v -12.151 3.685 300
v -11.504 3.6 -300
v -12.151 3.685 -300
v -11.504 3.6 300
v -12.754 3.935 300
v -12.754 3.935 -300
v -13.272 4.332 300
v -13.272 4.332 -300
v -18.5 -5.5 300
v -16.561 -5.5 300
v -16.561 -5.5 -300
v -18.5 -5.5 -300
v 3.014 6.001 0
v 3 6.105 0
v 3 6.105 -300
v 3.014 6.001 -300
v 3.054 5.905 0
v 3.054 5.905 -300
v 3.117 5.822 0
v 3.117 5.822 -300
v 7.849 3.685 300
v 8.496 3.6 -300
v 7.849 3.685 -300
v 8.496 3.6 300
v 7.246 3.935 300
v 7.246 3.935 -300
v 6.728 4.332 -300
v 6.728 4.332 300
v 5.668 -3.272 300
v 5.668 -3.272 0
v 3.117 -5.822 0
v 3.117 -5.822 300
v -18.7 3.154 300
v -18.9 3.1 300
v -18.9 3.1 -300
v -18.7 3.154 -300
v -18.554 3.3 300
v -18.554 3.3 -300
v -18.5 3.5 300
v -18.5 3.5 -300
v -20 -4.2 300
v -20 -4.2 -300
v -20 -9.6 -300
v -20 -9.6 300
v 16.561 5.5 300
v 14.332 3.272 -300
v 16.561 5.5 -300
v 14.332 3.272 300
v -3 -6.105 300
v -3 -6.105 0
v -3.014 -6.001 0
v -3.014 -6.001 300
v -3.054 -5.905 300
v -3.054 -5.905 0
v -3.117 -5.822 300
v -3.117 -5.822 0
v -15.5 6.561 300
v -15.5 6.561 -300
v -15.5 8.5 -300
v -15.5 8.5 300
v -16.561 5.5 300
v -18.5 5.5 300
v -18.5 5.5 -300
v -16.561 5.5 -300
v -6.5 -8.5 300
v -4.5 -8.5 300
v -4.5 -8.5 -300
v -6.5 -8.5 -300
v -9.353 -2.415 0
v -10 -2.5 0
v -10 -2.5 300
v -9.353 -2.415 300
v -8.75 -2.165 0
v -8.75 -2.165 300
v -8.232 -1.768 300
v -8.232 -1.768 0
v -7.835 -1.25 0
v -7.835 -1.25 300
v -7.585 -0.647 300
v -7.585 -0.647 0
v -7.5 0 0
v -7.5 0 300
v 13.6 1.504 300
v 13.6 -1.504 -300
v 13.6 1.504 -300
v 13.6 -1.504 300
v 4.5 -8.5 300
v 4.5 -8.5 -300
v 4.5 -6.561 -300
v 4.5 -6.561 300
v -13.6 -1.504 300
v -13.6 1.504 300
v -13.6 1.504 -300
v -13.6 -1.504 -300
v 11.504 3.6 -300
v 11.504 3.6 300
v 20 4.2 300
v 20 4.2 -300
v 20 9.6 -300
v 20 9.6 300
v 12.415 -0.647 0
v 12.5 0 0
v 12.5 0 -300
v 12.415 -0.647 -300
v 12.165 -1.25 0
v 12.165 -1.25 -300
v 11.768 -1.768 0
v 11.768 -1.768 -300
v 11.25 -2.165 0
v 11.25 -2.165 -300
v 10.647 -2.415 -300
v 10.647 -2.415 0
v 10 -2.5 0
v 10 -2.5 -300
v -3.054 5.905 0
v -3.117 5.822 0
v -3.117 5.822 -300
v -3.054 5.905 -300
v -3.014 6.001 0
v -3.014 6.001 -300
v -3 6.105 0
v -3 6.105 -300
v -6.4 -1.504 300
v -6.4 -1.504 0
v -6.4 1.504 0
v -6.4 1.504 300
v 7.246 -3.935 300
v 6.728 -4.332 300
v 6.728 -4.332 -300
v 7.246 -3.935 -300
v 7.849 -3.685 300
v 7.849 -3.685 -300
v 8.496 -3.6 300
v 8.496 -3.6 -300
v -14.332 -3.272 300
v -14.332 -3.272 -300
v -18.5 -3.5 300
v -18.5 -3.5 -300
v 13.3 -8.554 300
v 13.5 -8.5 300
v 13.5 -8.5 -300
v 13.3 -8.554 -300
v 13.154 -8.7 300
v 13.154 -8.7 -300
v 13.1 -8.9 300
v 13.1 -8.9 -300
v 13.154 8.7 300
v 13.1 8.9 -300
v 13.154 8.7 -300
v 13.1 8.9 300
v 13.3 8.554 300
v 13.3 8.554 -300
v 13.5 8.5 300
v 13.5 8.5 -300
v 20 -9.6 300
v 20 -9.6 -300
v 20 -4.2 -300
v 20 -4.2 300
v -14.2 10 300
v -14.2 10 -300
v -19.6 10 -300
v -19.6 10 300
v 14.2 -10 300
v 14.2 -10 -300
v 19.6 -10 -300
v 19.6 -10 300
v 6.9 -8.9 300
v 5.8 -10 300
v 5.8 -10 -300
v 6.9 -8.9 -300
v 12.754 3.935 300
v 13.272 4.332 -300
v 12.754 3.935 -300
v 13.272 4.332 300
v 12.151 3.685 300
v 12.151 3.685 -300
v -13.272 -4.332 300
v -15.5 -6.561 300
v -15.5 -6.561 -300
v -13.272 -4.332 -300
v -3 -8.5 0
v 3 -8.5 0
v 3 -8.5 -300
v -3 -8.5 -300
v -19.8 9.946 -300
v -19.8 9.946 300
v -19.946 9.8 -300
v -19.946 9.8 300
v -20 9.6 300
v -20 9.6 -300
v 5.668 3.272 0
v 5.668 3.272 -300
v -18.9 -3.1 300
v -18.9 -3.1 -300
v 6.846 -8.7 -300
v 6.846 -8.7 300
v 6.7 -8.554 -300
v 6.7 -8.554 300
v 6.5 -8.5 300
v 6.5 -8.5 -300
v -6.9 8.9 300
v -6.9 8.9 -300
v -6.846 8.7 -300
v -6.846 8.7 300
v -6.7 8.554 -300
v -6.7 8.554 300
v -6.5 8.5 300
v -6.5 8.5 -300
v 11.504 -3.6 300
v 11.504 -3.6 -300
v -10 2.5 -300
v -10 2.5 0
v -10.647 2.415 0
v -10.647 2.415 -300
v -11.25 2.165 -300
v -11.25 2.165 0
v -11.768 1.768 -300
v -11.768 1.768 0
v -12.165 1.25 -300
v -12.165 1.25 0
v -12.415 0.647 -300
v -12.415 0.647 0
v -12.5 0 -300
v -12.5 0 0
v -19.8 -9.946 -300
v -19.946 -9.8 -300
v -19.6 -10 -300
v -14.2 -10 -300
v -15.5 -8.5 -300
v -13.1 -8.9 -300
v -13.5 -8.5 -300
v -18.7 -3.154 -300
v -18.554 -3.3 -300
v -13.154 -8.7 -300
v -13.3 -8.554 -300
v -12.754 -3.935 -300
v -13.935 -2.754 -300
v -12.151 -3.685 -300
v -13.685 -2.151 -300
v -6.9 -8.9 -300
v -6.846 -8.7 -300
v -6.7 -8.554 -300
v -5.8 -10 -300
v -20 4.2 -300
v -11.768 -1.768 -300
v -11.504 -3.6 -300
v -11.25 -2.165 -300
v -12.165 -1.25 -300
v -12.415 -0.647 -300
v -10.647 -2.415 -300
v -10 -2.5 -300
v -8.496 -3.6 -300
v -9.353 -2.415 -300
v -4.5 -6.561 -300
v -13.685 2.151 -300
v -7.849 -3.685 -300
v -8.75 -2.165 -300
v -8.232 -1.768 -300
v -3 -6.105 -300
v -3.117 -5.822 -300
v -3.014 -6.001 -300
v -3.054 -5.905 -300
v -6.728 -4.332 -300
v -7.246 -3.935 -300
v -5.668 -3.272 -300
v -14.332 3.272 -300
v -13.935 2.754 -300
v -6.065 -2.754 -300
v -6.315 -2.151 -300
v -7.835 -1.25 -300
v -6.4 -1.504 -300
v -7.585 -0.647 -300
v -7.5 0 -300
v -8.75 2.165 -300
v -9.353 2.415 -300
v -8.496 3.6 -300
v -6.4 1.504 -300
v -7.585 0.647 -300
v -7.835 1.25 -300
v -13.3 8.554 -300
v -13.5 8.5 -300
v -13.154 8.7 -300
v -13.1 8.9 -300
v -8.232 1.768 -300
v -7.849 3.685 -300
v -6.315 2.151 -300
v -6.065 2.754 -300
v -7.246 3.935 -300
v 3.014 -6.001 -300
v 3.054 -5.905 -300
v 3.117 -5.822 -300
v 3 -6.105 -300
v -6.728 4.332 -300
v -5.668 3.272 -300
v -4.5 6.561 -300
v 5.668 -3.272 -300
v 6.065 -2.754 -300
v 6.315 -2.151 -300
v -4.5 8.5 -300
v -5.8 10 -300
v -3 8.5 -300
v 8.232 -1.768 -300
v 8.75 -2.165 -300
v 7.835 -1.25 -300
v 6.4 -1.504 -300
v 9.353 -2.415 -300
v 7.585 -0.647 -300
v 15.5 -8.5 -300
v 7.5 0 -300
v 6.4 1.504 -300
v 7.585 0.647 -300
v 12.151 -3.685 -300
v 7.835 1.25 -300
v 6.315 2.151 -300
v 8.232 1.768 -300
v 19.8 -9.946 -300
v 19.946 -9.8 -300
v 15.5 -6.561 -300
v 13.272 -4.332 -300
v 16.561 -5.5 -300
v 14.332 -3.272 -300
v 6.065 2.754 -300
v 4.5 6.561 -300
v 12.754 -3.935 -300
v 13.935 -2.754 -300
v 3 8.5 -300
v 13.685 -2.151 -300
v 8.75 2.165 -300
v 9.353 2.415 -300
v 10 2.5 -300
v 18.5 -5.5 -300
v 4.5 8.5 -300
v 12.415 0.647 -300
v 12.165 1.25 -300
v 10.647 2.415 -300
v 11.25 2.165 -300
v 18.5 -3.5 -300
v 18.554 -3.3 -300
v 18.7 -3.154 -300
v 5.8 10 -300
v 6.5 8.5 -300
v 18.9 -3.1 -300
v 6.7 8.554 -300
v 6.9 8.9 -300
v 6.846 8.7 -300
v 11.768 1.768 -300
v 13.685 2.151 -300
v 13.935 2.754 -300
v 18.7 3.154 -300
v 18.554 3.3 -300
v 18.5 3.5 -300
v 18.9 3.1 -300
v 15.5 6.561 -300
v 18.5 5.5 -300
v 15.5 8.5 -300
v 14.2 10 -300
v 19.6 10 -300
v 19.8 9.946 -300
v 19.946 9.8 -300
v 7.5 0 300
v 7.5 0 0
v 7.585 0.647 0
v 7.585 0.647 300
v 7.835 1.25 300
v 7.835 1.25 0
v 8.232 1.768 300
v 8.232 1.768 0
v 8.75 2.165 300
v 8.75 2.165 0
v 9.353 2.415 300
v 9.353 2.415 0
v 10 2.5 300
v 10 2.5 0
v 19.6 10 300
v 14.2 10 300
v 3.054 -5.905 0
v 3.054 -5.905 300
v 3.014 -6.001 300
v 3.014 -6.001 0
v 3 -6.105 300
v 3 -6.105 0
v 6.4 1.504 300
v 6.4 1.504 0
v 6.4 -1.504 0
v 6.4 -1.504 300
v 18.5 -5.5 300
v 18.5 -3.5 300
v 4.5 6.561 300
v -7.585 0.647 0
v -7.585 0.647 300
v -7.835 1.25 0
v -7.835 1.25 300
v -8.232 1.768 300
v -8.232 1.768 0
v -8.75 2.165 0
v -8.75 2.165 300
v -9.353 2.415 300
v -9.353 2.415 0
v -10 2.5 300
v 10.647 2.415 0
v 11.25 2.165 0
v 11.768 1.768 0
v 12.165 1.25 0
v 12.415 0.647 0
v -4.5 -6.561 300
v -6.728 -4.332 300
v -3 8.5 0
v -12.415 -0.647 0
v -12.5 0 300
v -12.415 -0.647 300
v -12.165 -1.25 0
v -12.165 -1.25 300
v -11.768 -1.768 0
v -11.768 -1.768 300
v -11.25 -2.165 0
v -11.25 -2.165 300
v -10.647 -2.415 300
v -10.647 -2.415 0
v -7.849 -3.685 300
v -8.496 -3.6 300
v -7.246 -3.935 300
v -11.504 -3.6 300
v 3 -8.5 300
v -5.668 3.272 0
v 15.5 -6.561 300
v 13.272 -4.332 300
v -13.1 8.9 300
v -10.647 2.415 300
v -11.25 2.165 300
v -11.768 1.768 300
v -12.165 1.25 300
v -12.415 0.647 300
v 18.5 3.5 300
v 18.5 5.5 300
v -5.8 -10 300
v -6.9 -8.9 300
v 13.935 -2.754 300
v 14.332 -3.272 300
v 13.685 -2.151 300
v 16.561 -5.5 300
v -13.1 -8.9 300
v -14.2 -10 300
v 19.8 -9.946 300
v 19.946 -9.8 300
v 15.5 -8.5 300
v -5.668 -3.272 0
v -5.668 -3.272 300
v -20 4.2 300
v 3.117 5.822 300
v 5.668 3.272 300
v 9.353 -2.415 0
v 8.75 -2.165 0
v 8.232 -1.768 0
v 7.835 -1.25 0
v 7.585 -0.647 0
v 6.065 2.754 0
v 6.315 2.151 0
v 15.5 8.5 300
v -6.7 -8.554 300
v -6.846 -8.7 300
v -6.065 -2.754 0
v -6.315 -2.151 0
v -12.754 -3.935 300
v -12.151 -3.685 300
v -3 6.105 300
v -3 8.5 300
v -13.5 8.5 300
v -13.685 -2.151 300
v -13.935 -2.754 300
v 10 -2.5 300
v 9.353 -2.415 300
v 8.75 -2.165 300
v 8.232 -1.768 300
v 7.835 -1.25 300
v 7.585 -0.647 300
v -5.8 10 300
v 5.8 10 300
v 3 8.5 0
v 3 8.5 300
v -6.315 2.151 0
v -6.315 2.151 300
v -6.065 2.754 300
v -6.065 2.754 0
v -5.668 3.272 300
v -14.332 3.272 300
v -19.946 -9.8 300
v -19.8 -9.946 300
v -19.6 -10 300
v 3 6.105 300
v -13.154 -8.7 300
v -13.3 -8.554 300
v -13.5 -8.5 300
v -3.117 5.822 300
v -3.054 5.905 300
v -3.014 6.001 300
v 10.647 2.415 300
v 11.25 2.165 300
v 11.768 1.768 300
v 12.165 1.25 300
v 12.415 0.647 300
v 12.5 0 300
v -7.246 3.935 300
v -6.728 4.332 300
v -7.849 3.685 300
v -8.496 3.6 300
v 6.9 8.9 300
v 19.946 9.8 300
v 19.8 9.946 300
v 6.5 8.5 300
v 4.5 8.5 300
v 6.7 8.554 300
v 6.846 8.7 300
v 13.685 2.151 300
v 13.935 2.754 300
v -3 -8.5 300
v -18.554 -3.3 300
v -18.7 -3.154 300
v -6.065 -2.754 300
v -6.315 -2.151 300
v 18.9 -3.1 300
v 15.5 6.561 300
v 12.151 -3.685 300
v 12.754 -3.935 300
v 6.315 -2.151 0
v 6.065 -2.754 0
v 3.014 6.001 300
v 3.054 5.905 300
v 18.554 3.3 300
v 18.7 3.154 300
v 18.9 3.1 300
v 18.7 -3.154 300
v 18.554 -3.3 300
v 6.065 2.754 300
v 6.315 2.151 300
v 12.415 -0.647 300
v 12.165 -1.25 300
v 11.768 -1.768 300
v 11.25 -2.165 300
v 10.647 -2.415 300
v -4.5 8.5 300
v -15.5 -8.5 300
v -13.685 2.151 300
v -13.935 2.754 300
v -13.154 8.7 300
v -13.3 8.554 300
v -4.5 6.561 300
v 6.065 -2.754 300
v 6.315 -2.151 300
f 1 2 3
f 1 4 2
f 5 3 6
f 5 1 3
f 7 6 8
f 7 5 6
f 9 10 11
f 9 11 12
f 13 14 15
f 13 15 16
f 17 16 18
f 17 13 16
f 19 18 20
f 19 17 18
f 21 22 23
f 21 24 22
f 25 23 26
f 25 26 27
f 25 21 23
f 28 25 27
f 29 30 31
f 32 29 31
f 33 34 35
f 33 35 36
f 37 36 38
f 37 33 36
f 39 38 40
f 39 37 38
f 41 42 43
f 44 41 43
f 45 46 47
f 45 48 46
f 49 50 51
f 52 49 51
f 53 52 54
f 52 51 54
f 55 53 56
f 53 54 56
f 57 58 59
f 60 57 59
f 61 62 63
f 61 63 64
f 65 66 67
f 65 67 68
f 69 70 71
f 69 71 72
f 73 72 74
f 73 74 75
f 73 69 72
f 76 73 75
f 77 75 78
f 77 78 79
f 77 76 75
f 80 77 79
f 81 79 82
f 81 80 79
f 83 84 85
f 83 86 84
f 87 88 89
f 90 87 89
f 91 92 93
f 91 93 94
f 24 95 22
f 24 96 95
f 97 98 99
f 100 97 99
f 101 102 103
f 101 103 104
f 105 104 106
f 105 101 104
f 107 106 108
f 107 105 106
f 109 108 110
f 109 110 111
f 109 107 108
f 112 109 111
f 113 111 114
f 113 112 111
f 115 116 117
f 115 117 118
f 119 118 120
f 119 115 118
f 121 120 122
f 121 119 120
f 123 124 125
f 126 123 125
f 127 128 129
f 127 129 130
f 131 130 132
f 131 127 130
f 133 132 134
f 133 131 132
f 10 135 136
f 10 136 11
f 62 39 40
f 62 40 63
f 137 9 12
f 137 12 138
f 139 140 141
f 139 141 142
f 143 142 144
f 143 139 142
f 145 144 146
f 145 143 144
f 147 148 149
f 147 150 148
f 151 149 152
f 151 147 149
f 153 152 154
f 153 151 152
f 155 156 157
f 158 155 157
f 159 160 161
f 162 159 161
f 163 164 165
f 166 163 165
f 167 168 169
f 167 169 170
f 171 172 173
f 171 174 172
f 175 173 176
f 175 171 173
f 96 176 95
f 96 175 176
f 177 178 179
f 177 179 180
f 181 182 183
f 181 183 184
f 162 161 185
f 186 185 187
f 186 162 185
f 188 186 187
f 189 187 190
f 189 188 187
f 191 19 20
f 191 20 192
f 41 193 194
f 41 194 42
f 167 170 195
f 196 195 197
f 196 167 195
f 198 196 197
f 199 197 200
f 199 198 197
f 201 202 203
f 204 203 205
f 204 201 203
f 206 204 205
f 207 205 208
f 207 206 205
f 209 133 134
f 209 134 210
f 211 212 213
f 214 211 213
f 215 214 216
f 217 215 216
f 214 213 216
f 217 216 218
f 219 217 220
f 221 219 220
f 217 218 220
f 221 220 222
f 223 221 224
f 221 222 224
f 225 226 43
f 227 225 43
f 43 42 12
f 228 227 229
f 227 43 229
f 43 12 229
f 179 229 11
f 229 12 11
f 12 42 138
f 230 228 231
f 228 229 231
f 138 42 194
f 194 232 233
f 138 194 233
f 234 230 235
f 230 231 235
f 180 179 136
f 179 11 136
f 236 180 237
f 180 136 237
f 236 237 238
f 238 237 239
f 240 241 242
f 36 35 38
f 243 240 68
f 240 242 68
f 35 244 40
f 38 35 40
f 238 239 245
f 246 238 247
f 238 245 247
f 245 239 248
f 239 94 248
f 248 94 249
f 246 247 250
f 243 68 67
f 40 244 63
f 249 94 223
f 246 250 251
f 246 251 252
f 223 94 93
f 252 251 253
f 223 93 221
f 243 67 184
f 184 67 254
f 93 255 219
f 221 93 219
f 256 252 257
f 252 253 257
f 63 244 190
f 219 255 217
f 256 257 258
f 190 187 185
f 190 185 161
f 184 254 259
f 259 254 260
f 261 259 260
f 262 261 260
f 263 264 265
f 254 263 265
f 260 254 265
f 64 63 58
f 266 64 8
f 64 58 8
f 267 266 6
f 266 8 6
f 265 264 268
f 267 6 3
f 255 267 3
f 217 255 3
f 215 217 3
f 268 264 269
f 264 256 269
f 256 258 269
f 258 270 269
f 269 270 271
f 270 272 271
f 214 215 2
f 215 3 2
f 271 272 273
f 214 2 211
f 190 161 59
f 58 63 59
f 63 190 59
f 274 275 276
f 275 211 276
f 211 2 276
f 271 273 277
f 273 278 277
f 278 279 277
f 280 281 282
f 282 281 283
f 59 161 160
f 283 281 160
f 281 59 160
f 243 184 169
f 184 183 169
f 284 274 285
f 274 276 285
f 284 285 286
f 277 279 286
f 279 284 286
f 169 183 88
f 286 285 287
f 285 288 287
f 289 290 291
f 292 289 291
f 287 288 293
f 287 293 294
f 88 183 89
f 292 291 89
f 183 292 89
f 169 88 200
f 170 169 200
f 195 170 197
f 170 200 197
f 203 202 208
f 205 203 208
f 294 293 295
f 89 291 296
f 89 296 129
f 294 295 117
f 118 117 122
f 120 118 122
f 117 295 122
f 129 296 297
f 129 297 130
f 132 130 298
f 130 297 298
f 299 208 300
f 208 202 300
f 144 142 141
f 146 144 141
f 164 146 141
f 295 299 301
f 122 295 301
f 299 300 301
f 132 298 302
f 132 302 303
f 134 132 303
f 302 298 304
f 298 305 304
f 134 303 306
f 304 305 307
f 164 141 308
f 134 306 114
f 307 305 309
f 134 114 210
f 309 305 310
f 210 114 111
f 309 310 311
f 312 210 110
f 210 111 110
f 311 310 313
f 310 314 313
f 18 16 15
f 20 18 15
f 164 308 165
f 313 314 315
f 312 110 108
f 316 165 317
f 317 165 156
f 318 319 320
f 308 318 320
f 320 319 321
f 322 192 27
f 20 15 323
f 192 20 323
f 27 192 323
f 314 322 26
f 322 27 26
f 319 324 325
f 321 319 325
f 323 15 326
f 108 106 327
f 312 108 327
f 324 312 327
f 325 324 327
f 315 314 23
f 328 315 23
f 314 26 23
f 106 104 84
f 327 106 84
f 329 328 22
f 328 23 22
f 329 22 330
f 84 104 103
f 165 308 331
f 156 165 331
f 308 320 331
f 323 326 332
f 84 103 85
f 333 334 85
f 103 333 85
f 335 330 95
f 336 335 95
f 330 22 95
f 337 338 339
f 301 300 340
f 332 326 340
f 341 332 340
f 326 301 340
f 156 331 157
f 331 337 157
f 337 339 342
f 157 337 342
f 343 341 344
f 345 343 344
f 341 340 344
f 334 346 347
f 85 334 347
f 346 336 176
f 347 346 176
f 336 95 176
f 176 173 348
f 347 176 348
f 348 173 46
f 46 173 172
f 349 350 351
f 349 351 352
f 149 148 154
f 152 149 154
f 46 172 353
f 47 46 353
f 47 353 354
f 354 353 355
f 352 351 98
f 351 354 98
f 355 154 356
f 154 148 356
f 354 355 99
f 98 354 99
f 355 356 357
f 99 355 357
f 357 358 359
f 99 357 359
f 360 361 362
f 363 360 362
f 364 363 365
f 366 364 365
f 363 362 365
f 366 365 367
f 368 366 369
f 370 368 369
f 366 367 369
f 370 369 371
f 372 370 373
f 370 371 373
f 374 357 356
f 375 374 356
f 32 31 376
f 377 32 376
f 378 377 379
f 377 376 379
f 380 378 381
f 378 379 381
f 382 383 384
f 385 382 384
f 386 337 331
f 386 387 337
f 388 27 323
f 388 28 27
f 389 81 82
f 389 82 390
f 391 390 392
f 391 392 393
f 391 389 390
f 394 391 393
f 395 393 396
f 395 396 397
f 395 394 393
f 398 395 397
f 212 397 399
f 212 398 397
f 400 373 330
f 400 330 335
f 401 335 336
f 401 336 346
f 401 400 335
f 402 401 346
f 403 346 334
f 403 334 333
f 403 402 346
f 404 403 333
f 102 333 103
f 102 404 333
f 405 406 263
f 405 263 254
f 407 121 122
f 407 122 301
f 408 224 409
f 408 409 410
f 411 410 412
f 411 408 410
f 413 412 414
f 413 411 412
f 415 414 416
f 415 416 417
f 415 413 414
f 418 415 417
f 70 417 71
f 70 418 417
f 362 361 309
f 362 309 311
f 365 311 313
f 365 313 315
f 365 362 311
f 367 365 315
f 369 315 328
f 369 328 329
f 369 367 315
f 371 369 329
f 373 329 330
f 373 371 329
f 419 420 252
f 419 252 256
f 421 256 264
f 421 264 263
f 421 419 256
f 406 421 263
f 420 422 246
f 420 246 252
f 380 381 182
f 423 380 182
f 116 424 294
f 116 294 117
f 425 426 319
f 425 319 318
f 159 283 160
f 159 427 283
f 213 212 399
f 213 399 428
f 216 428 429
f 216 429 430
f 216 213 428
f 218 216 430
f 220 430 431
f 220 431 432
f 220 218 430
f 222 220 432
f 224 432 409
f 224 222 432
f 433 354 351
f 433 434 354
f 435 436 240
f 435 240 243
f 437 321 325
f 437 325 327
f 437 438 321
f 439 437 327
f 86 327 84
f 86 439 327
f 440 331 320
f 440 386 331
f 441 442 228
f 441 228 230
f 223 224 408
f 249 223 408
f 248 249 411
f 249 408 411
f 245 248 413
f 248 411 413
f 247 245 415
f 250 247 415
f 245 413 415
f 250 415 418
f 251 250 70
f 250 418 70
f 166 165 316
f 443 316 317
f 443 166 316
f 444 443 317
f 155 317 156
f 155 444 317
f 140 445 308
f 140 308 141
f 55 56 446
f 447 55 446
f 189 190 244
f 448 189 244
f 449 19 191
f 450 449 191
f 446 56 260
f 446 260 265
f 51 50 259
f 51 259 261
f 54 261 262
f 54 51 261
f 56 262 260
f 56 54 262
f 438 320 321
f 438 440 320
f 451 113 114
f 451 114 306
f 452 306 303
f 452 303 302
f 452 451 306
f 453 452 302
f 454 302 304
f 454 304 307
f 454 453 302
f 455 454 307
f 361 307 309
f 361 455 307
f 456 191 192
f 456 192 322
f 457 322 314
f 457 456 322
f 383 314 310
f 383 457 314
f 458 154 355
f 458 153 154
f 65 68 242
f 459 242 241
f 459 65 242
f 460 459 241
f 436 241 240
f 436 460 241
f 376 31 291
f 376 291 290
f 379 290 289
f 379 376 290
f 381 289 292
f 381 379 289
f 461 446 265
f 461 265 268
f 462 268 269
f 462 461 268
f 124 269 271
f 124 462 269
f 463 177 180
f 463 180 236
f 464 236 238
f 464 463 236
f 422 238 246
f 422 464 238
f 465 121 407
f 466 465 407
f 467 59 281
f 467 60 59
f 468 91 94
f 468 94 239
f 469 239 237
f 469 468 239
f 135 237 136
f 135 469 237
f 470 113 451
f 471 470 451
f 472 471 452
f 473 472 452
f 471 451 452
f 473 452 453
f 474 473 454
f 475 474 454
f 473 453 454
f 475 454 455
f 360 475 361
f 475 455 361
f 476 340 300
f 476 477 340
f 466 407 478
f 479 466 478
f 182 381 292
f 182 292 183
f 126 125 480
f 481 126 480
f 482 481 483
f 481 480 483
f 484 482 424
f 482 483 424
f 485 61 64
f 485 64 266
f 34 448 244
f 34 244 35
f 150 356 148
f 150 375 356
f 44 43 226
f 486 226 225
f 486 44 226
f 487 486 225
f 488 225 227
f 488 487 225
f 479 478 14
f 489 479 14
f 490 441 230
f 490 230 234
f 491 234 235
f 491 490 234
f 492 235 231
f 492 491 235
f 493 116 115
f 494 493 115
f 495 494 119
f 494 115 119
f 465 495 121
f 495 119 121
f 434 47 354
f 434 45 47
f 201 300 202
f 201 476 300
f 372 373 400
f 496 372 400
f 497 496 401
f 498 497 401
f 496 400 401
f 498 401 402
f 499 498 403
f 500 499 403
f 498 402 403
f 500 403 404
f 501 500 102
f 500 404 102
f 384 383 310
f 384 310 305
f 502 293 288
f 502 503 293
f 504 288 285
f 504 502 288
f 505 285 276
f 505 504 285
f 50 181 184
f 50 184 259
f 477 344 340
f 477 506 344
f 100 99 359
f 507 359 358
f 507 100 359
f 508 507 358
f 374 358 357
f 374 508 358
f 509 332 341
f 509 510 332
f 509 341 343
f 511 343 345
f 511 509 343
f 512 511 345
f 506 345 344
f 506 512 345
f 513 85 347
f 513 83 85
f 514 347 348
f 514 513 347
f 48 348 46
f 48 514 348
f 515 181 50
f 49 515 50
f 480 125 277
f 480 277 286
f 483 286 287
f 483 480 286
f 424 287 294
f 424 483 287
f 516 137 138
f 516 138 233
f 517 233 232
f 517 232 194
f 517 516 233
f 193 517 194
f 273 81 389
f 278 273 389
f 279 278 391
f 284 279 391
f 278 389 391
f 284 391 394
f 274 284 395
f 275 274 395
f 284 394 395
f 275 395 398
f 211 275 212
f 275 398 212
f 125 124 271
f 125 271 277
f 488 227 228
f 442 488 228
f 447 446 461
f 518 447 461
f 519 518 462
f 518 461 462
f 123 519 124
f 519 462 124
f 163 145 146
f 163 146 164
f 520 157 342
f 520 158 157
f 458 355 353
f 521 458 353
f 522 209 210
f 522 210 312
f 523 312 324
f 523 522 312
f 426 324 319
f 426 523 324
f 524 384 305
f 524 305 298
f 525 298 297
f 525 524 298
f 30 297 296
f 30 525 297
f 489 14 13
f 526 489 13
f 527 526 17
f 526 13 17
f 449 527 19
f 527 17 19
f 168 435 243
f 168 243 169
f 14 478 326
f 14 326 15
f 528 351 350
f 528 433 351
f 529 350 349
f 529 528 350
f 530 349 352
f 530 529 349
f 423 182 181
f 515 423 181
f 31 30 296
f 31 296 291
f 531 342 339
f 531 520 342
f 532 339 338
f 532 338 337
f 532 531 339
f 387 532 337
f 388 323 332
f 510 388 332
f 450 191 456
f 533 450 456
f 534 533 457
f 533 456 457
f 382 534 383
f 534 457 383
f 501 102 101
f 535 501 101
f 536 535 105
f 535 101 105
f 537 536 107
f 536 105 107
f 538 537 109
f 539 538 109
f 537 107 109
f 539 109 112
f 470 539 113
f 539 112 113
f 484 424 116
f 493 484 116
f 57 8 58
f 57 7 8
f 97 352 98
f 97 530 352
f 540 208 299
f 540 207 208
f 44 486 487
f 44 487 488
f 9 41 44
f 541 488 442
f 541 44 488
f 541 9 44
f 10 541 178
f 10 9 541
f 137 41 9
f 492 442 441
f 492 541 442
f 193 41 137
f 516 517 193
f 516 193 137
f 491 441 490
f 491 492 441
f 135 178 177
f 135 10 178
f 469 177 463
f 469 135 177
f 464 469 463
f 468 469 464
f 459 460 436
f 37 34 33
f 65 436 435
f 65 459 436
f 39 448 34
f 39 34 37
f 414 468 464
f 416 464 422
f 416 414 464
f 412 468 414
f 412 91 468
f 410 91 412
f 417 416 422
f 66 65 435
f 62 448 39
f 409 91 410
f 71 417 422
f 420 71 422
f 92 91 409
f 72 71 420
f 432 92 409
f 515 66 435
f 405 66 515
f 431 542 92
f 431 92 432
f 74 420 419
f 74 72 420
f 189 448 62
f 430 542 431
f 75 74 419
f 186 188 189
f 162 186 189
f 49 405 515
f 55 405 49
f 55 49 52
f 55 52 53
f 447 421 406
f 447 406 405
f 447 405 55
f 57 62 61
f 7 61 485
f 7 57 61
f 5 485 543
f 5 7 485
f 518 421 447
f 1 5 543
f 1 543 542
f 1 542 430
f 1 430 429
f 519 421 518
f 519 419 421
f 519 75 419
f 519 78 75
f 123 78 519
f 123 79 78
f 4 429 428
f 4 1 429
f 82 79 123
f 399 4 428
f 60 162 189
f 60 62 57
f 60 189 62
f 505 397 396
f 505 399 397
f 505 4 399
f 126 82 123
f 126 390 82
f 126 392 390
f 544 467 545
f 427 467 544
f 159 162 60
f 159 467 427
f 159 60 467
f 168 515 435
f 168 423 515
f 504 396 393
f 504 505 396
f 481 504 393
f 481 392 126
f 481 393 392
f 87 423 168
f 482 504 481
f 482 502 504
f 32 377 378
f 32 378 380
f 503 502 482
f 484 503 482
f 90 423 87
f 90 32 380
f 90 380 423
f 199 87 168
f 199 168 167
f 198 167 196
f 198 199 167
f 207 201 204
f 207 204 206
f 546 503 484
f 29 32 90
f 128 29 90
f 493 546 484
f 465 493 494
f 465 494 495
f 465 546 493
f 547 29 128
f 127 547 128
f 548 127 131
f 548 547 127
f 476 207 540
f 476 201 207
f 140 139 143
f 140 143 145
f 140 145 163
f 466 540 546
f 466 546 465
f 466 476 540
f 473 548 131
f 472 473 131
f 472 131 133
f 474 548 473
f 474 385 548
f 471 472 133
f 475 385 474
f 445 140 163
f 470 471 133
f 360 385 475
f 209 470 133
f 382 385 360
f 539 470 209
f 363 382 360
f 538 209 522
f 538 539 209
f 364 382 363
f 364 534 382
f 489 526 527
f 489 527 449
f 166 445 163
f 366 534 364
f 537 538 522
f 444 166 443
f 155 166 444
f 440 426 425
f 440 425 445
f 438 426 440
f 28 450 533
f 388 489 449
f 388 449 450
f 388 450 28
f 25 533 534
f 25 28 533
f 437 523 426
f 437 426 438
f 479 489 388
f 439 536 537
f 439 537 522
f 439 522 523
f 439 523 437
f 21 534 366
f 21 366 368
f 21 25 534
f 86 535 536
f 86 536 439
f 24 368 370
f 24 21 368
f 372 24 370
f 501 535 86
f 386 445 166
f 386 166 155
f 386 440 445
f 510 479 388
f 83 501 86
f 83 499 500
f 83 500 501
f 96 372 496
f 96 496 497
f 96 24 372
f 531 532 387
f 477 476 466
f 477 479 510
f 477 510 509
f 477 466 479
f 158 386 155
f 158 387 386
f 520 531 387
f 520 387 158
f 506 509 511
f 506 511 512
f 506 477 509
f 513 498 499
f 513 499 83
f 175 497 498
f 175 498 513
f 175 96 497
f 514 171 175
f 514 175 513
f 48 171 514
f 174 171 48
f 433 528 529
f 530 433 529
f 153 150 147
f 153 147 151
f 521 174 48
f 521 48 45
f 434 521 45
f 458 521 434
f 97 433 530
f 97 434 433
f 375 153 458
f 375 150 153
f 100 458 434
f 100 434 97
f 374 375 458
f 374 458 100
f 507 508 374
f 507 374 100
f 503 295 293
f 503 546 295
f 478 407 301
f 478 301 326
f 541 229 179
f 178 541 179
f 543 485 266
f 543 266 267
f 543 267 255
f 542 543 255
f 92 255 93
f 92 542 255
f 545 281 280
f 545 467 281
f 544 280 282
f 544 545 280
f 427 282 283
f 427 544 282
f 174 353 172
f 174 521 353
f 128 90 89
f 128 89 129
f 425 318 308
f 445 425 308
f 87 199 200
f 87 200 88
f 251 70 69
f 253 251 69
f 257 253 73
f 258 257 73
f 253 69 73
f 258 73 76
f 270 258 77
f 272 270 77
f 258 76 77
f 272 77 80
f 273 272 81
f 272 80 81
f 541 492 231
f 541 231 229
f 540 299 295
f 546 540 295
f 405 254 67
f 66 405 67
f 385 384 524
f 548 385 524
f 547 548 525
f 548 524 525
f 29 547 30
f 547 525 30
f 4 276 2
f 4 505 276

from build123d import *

# Parameters (mm, degrees)
RESSALTO_EXTRUS_O1_DEPTH = 300


with BuildPart() as part:
    # Esboço1 → Ressalto-extrusão1 (new body, symmetric)
    with BuildSketch(Plane.XY):
        with BuildLine():
            Line((-13.1, 8.9), (-14.2, 10))
            Line((-14.2, 10), (-19.6, 10))
            ThreePointArc((-19.6, 10), (-19.882842712, 9.882842712), (-20, 9.6))
            Line((-20, 9.6), (-20, 4.2))
            Line((-20, 4.2), (-18.9, 3.1))
            ThreePointArc((-18.9, 3.1), (-18.617157287, 3.217157287), (-18.5, 3.5))
            Line((-18.5, 3.5), (-18.5, 5.5))
            Line((-18.5, 5.5), (-16.560660172, 5.5))
            Line((-16.560660172, 5.5), (-14.332233047, 3.271572875))
            ThreePointArc((-14.332233047, 3.271572875), (-13.790301169, 2.460514503), (-13.6, 1.503805922))
            Line((-13.6, 1.503805922), (-13.6, 0))
            Line((-13.6, 0), (-13.6, -1.503805922))
            ThreePointArc((-13.6, -1.503805922), (-13.790301169, -2.460514503), (-14.332233047, -3.271572875))
            Line((-14.332233047, -3.271572875), (-16.560660172, -5.5))
            Line((-16.560660172, -5.5), (-18.5, -5.5))
            Line((-18.5, -5.5), (-18.5, -3.5))
            ThreePointArc((-18.5, -3.5), (-18.617157287, -3.217157288), (-18.9, -3.1))
            Line((-18.9, -3.1), (-20, -4.2))
            Line((-20, -4.2), (-20, -9.6))
            ThreePointArc((-20, -9.6), (-19.882842712, -9.882842712), (-19.6, -10))
            Line((-19.6, -10), (-14.2, -10))
            Line((-14.2, -10), (-13.1, -8.9))
            ThreePointArc((-13.1, -8.9), (-13.217157287, -8.617157288), (-13.5, -8.5))
            Line((-13.5, -8.5), (-15.5, -8.5))
            Line((-15.5, -8.5), (-15.5, -6.560660172))
            Line((-15.5, -6.560660172), (-13.271572875, -4.332233047))
            ThreePointArc((-13.271572875, -4.332233047), (-12.460514503, -3.790301169), (-11.503805922, -3.6))
            Line((-11.503805922, -3.6), (-10, -3.6))
            Line((-10, -3.6), (-8.496194078, -3.6))
            ThreePointArc((-8.496194078, -3.6), (-7.539485497, -3.790301169), (-6.728427125, -4.332233047))
            Line((-6.728427125, -4.332233047), (-4.5, -6.560660172))
            Line((-4.5, -6.560660172), (-4.5, -8.5))
            Line((-4.5, -8.5), (-6.5, -8.5))
            ThreePointArc((-6.5, -8.5), (-6.782842712, -8.617157288), (-6.9, -8.9))
            Line((-6.9, -8.9), (-5.8, -10))
            Line((-5.8, -10), (5.8, -10))
            Line((5.8, -10), (6.9, -8.9))
            ThreePointArc((6.9, -8.9), (6.782842712, -8.617157288), (6.5, -8.5))
            Line((6.5, -8.5), (4.5, -8.5))
            Line((4.5, -8.5), (4.5, -6.560660172))
            Line((4.5, -6.560660172), (6.728427125, -4.332233047))
            ThreePointArc((6.728427125, -4.332233047), (7.539485497, -3.790301169), (8.496194078, -3.6))
            Line((8.496194078, -3.6), (10, -3.6))
            Line((10, -3.6), (11.503805922, -3.6))
            ThreePointArc((11.503805922, -3.6), (12.460514503, -3.790301169), (13.271572875, -4.332233047))
            Line((13.271572875, -4.332233047), (15.5, -6.560660172))
            Line((15.5, -6.560660172), (15.5, -8.5))
            Line((15.5, -8.5), (13.5, -8.5))
            ThreePointArc((13.5, -8.5), (13.217157287, -8.617157288), (13.1, -8.9))
            Line((13.1, -8.9), (14.2, -10))
            Line((14.2, -10), (19.6, -10))
            ThreePointArc((19.6, -10), (19.882842712, -9.882842712), (20, -9.6))
            Line((20, -9.6), (20, -4.2))
            Line((20, -4.2), (18.9, -3.1))
            ThreePointArc((18.9, -3.1), (18.617157287, -3.217157288), (18.5, -3.5))
            Line((18.5, -3.5), (18.5, -5.5))
            Line((18.5, -5.5), (16.560660172, -5.5))
            Line((16.560660172, -5.5), (14.332233047, -3.271572875))
            ThreePointArc((14.332233047, -3.271572875), (13.790301169, -2.460514503), (13.6, -1.503805922))
            Line((13.6, -1.503805922), (13.6, 0))
            Line((13.6, 0), (13.6, 1.503805922))
            ThreePointArc((13.6, 1.503805922), (13.790301169, 2.460514503), (14.332233047, 3.271572875))
            Line((14.332233047, 3.271572875), (16.560660172, 5.5))
            Line((16.560660172, 5.5), (18.5, 5.5))
            Line((18.5, 5.5), (18.5, 3.5))
            ThreePointArc((18.5, 3.5), (18.617157287, 3.217157287), (18.9, 3.1))
            Line((18.9, 3.1), (20, 4.2))
            Line((20, 4.2), (20, 9.6))
            ThreePointArc((20, 9.6), (19.882842712, 9.882842712), (19.6, 10))
            Line((19.6, 10), (14.2, 10))
            Line((14.2, 10), (13.1, 8.9))
            ThreePointArc((13.1, 8.9), (13.217157287, 8.617157287), (13.5, 8.5))
            Line((13.5, 8.5), (15.5, 8.5))
            Line((15.5, 8.5), (15.5, 6.560660172))
            Line((15.5, 6.560660172), (13.271572875, 4.332233047))
            ThreePointArc((13.271572875, 4.332233047), (12.460514503, 3.790301169), (11.503805922, 3.6))
            Line((11.503805922, 3.6), (10, 3.6))
            Line((10, 3.6), (8.496194078, 3.6))
            ThreePointArc((8.496194078, 3.6), (7.539485497, 3.790301169), (6.728427125, 4.332233047))
            Line((6.728427125, 4.332233047), (4.5, 6.560660172))
            Line((4.5, 6.560660172), (4.5, 8.5))
            Line((4.5, 8.5), (6.5, 8.5))
            ThreePointArc((6.5, 8.5), (6.782842712, 8.617157288), (6.9, 8.9))
            Line((6.9, 8.9), (5.8, 10))
            Line((5.8, 10), (-5.8, 10))
            Line((-5.8, 10), (-6.9, 8.9))
            ThreePointArc((-6.9, 8.9), (-6.782842712, 8.617157288), (-6.5, 8.5))
            Line((-6.5, 8.5), (-4.5, 8.5))
            Line((-4.5, 8.5), (-4.5, 6.560660172))
            Line((-4.5, 6.560660172), (-6.728427125, 4.332233047))
            ThreePointArc((-6.728427125, 4.332233047), (-7.539485497, 3.790301169), (-8.496194078, 3.6))
            Line((-8.496194078, 3.6), (-10, 3.6))
            Line((-10, 3.6), (-11.503805922, 3.6))
            ThreePointArc((-11.503805922, 3.6), (-12.460514503, 3.790301169), (-13.271572875, 4.332233047))
            Line((-13.271572875, 4.332233047), (-15.5, 6.560660172))
            Line((-15.5, 6.560660172), (-15.5, 8.5))
            Line((-15.5, 8.5), (-13.5, 8.5))
            ThreePointArc((-13.5, 8.5), (-13.217157287, 8.617157287), (-13.1, 8.9))
        make_face()
        with BuildLine():
            Line((-3, 8.5), (3, 8.5))
            Line((3, 8.5), (3, 6.105025253))
            ThreePointArc((3, 6.105025253), (3.030448187, 5.95195188), (3.117157288, 5.822182541))
            Line((3.117157288, 5.822182541), (5.667766953, 3.271572875))
            ThreePointArc((5.667766953, 3.271572875), (6.209698831, 2.460514503), (6.4, 1.503805922))
            Line((6.4, 1.503805922), (6.4, 0))
            Line((6.4, 0), (6.4, -1.503805922))
            ThreePointArc((6.4, -1.503805922), (6.209698831, -2.460514503), (5.667766953, -3.271572875))
            Line((5.667766953, -3.271572875), (3.117157288, -5.822182541))
            ThreePointArc((3.117157288, -5.822182541), (3.030448187, -5.95195188), (3, -6.105025253))
            Line((3, -6.105025253), (3, -8.5))
            Line((3, -8.5), (-3, -8.5))
            Line((-3, -8.5), (-3, -6.105025253))
            ThreePointArc((-3, -6.105025253), (-3.030448187, -5.95195188), (-3.117157288, -5.822182541))
            Line((-3.117157288, -5.822182541), (-5.667766953, -3.271572875))
            ThreePointArc((-5.667766953, -3.271572875), (-6.209698831, -2.460514503), (-6.4, -1.503805922))
            Line((-6.4, -1.503805922), (-6.4, 0))
            Line((-6.4, 0), (-6.4, 1.503805922))
            ThreePointArc((-6.4, 1.503805922), (-6.209698831, 2.460514503), (-5.667766953, 3.271572875))
            Line((-5.667766953, 3.271572875), (-3.117157288, 5.822182541))
            ThreePointArc((-3.117157288, 5.822182541), (-3.030448187, 5.95195188), (-3, 6.105025253))
            Line((-3, 6.105025253), (-3, 8.5))
        make_face(mode=Mode.SUBTRACT)
        with BuildLine():
            ThreePointArc((-10, 2.5), (-11.767766953, 1.767766953), (-12.5, 0))
            ThreePointArc((-12.5, 0), (-11.767766953, -1.767766953), (-10, -2.5))
            ThreePointArc((-10, -2.5), (-8.232233047, -1.767766953), (-7.5, 0))
            ThreePointArc((-7.5, 0), (-8.232233047, 1.767766953), (-10, 2.5))
        make_face(mode=Mode.SUBTRACT)
        with BuildLine():
            ThreePointArc((12.5, 0), (11.767766953, -1.767766953), (10, -2.5))
            ThreePointArc((10, -2.5), (8.232233047, -1.767766953), (7.5, 0))
            ThreePointArc((7.5, 0), (8.232233047, 1.767766953), (10, 2.5))
            ThreePointArc((10, 2.5), (11.767766953, 1.767766953), (12.5, 0))
        make_face(mode=Mode.SUBTRACT)
    extrude(amount=RESSALTO_EXTRUS_O1_DEPTH, both=True)


solid = part.part
